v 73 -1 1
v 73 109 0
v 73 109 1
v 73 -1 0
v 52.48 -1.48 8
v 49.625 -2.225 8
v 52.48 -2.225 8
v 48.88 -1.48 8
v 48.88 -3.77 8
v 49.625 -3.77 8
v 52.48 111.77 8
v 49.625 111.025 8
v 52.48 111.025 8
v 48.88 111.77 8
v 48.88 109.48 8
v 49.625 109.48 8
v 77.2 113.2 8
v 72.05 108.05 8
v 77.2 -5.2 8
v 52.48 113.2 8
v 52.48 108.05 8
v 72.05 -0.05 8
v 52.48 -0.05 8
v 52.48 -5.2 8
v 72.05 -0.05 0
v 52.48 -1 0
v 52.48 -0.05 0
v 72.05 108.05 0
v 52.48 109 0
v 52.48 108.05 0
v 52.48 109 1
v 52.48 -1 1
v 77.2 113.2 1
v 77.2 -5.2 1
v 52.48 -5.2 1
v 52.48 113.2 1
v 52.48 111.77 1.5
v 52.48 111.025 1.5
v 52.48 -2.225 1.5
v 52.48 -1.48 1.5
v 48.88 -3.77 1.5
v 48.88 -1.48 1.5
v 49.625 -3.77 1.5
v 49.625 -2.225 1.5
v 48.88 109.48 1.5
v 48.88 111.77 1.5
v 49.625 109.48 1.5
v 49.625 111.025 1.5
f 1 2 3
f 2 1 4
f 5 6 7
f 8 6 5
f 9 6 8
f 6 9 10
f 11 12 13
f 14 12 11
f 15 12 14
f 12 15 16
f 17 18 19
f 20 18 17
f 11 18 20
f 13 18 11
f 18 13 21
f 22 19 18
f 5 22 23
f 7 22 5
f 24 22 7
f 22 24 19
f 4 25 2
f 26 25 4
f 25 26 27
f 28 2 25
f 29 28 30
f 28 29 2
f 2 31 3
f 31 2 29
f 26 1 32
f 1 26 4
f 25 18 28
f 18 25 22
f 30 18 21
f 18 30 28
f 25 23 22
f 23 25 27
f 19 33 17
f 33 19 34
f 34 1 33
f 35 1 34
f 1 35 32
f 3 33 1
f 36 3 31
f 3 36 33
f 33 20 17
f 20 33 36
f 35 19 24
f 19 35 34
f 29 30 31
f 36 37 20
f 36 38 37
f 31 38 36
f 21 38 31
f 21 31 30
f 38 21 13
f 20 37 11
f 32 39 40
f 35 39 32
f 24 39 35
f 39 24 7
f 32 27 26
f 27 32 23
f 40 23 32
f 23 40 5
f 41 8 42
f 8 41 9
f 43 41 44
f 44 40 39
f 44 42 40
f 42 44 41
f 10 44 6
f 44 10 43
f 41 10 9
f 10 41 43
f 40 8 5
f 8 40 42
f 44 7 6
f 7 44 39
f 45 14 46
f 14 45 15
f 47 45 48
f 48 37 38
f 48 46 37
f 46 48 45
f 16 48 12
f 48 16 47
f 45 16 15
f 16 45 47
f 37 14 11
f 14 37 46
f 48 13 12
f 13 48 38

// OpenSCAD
// Generated by SolidPython 1.0.4 on 2021-01-27 23:57:22


union() {
	union() {
		difference() {
			union() {
				difference() {
					translate(v = [-1.0000000000, -1.0000000000, 0]) {
						cube(size = [74.0000000000, 110.0000000000, 8]);
					}
					translate(v = [-0.0500000000, -0.0500000000, 0]) {
						cube(size = [72.1000000000, 108.1000000000, 8]);
					}
				}
				translate(v = [0, 0, 1]) {
					difference() {
						translate(v = [-5.2000000000, -5.2000000000, 0]) {
							cube(size = [82.4000000000, 118.4000000000, 7]);
						}
						translate(v = [-1.0000000000, -1.0000000000, 0]) {
							cube(size = [74.0000000000, 110.0000000000, 7]);
						}
					}
				}
			}
			translate(v = [-5.2000000000, -5.2000000000, 0]) {
				cube(size = [57.6800000000, 118.4000000000, 8]);
			}
		}
		translate(v = [48.4800000000, -4.1700000000, 0]) {
			translate(v = [0.4000000000, 0.4000000000, 0]) {
				translate(v = [0, 0, 1.5000000000]) {
					translate(v = [3.6000000000, 2.2900000000, 0]) {
						rotate(a = -180) {
							union() {
								translate(v = [2.8550000000, 0, 0]) {
									cube(size = [0.7450000000, 2.2900000000, 6.5000000000]);
								}
								cube(size = [3.6000000000, 0.7450000000, 6.5000000000]);
							}
						}
					}
				}
			}
		}
	}
	translate(v = [48.4800000000, 109.0800000000, 0]) {
		translate(v = [0.4000000000, 0.4000000000, 0]) {
			translate(v = [0, 0, 1.5000000000]) {
				translate(v = [3.6000000000, 2.2900000000, 0]) {
					rotate(a = -180) {
						union() {
							translate(v = [2.8550000000, 0, 0]) {
								cube(size = [0.7450000000, 2.2900000000, 6.5000000000]);
							}
							cube(size = [3.6000000000, 0.7450000000, 6.5000000000]);
						}
					}
				}
			}
		}
	}
}
